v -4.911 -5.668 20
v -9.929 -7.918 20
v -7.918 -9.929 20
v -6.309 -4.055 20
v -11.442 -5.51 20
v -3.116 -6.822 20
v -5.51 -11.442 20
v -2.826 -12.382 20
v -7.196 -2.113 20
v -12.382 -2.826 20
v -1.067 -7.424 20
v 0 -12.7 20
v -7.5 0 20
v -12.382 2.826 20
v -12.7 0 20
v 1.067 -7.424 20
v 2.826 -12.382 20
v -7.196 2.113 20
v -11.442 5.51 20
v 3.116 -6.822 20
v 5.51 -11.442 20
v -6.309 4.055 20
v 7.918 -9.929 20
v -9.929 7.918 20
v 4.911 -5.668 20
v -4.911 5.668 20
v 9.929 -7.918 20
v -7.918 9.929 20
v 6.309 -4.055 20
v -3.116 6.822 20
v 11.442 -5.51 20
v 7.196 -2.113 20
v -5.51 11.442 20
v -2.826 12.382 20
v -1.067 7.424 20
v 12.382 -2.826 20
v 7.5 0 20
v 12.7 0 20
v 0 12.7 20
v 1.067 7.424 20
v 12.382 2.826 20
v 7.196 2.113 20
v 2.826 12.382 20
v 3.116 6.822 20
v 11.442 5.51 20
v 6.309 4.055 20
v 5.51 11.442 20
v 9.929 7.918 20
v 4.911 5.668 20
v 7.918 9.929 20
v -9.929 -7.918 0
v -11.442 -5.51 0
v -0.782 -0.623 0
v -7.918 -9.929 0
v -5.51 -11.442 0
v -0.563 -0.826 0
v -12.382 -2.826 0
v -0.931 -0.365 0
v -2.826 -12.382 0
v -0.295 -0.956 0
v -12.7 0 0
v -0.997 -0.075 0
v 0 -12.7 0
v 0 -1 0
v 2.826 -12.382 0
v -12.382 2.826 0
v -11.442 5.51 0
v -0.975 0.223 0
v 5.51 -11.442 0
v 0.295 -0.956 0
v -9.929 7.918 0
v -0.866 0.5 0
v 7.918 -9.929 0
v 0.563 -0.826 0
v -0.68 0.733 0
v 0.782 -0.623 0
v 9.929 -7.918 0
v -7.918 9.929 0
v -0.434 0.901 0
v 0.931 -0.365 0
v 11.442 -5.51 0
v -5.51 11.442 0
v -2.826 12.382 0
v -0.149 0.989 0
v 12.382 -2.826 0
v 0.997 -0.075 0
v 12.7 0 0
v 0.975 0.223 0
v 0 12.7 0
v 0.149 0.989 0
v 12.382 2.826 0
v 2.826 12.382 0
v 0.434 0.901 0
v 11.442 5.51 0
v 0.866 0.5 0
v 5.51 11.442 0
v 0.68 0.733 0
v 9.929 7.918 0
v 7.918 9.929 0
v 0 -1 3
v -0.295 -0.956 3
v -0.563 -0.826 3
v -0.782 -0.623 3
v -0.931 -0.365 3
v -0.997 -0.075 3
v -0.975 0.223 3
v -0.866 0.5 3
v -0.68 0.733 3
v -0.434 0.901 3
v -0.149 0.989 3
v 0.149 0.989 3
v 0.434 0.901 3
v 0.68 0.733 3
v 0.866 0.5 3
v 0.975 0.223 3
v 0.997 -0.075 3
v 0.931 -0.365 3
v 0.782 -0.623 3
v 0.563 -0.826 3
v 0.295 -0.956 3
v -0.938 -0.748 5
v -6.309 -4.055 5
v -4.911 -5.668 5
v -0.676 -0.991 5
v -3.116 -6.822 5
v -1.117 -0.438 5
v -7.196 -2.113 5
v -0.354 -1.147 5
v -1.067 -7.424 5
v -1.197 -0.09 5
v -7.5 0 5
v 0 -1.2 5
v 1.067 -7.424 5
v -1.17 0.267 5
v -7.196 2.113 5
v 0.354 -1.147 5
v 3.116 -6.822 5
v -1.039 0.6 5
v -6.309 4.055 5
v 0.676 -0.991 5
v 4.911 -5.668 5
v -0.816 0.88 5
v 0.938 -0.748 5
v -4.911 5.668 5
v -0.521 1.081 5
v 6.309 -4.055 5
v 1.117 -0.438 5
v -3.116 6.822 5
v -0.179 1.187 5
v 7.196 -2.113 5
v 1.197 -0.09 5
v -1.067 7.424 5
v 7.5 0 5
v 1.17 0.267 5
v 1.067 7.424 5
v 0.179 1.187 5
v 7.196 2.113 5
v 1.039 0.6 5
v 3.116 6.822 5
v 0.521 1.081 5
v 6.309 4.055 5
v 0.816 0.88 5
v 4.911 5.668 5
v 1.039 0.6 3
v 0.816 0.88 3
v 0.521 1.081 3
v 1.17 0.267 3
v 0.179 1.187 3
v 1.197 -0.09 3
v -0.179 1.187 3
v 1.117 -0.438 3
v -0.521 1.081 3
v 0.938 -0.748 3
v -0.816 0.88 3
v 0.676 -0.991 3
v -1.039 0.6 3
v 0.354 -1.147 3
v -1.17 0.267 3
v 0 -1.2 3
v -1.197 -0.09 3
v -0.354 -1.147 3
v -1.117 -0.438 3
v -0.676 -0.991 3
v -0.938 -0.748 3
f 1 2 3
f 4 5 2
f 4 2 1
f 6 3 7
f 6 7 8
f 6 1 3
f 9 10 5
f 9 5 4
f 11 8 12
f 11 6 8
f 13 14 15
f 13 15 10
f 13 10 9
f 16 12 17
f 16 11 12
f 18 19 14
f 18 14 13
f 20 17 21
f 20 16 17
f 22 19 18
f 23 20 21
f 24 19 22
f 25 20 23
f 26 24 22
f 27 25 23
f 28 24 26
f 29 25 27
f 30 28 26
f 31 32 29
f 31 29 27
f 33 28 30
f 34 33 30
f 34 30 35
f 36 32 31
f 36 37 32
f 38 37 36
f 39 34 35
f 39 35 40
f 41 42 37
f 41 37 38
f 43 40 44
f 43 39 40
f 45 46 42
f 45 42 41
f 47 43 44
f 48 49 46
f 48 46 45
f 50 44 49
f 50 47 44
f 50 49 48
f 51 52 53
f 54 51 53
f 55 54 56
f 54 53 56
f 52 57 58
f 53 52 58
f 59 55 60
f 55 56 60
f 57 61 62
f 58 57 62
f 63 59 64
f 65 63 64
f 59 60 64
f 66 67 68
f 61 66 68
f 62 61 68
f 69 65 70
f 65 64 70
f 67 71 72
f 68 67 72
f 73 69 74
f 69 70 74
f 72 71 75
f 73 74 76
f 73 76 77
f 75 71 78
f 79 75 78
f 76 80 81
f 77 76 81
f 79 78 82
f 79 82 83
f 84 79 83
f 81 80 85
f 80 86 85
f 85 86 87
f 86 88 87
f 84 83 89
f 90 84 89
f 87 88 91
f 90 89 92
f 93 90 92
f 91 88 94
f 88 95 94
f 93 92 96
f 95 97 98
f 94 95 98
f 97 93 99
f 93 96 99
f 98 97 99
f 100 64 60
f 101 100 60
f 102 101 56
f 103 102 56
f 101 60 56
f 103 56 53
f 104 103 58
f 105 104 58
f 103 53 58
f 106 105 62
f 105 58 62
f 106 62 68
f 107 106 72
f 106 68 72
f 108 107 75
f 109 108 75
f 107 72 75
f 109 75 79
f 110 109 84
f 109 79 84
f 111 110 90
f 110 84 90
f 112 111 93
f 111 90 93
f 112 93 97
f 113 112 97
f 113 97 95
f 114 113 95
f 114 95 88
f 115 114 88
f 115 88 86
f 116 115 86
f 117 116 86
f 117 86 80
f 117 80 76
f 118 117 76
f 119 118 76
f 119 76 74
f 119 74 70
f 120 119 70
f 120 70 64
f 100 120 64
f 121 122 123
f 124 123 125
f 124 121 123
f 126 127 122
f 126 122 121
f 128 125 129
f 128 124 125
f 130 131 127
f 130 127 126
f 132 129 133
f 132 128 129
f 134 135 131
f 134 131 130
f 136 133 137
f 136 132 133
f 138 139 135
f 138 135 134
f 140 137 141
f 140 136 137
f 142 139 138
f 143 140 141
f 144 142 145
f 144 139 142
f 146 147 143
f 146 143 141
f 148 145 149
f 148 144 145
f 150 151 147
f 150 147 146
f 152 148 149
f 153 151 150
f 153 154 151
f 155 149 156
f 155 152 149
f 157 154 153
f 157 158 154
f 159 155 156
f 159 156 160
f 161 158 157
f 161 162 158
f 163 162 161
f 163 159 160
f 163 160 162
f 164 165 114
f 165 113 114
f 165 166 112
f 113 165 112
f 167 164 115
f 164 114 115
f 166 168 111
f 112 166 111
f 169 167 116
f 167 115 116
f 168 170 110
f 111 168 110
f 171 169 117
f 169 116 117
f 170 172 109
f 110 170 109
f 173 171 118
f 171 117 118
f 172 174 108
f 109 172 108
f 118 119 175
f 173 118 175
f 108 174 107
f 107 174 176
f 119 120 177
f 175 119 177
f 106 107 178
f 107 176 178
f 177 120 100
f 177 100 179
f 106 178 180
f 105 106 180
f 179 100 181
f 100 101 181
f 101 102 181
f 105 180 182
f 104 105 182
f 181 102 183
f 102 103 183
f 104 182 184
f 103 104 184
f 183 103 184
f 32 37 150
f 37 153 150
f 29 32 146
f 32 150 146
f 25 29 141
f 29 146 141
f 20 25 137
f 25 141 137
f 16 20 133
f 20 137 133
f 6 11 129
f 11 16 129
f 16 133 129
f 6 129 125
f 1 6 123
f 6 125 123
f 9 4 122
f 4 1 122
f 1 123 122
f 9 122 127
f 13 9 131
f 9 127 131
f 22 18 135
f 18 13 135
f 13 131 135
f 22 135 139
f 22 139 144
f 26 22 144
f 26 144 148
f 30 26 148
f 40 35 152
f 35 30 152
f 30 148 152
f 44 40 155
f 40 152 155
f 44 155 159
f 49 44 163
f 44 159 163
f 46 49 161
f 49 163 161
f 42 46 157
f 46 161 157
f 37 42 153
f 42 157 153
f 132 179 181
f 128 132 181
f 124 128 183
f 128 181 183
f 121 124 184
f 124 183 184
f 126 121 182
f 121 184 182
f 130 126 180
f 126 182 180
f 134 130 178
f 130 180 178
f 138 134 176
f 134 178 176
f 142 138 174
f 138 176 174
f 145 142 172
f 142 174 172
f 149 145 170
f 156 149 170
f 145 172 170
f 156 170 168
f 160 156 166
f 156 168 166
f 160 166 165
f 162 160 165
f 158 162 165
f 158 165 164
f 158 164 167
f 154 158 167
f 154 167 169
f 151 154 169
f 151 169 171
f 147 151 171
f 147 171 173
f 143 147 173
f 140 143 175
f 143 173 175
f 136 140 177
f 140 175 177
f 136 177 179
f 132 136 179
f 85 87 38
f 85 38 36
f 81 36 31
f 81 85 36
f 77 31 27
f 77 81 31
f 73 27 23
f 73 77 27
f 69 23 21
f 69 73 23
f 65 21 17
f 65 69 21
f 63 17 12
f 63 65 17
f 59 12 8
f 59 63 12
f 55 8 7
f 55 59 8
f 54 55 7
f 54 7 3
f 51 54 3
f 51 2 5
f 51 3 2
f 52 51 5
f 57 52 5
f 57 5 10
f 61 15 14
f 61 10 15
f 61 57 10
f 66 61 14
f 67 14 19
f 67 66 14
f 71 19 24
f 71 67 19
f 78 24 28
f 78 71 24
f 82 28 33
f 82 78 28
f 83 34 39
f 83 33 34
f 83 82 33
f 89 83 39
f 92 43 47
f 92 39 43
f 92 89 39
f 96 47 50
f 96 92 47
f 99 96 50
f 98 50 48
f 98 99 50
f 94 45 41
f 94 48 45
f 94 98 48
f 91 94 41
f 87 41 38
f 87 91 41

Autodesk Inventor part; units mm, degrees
ref_plane "YZ Plane" through (0, 0, 0) normal (1, 0, 0) x (0, 1, 0)
ref_plane "XZ Plane" through (0, 0, 0) normal (0, 1, 0) x (-1, 0, 0)
ref_plane "XY Plane" through (0, 0, 0) normal (0, 0, 1) x (1, 0, 0)
sketch "Sketch1" plane through (0, 0, 0) normal (0, 0, 1) x (1, 0, 0)
  circle A0 centre (0, 0) radius 12.7
  dimension "d0" = 25.4
extrude "Extrusion1" add sketch "Sketch1" along normal blind 5
hole "Hole1" at (0, 0, 5) direction (0, 0, -1) diameter 2.4 depth 2
hole "Hole2" at (0, 0, 3) direction (0, 0, -1) diameter 2 end through all
sketch "Sketch2" plane through (0, 0, 5) normal (0, 0, 1) x (1, 0, 0)
  circle A0 centre (0, 0) radius 12.7 projected
  circle A1 centre (0, 0) radius 7.5
  dimension "d21" = 15
extrude "Extrusion2" add sketch "Sketch2" along normal blind 15
properties part number "Screw_Asm_Jig_Lower"
